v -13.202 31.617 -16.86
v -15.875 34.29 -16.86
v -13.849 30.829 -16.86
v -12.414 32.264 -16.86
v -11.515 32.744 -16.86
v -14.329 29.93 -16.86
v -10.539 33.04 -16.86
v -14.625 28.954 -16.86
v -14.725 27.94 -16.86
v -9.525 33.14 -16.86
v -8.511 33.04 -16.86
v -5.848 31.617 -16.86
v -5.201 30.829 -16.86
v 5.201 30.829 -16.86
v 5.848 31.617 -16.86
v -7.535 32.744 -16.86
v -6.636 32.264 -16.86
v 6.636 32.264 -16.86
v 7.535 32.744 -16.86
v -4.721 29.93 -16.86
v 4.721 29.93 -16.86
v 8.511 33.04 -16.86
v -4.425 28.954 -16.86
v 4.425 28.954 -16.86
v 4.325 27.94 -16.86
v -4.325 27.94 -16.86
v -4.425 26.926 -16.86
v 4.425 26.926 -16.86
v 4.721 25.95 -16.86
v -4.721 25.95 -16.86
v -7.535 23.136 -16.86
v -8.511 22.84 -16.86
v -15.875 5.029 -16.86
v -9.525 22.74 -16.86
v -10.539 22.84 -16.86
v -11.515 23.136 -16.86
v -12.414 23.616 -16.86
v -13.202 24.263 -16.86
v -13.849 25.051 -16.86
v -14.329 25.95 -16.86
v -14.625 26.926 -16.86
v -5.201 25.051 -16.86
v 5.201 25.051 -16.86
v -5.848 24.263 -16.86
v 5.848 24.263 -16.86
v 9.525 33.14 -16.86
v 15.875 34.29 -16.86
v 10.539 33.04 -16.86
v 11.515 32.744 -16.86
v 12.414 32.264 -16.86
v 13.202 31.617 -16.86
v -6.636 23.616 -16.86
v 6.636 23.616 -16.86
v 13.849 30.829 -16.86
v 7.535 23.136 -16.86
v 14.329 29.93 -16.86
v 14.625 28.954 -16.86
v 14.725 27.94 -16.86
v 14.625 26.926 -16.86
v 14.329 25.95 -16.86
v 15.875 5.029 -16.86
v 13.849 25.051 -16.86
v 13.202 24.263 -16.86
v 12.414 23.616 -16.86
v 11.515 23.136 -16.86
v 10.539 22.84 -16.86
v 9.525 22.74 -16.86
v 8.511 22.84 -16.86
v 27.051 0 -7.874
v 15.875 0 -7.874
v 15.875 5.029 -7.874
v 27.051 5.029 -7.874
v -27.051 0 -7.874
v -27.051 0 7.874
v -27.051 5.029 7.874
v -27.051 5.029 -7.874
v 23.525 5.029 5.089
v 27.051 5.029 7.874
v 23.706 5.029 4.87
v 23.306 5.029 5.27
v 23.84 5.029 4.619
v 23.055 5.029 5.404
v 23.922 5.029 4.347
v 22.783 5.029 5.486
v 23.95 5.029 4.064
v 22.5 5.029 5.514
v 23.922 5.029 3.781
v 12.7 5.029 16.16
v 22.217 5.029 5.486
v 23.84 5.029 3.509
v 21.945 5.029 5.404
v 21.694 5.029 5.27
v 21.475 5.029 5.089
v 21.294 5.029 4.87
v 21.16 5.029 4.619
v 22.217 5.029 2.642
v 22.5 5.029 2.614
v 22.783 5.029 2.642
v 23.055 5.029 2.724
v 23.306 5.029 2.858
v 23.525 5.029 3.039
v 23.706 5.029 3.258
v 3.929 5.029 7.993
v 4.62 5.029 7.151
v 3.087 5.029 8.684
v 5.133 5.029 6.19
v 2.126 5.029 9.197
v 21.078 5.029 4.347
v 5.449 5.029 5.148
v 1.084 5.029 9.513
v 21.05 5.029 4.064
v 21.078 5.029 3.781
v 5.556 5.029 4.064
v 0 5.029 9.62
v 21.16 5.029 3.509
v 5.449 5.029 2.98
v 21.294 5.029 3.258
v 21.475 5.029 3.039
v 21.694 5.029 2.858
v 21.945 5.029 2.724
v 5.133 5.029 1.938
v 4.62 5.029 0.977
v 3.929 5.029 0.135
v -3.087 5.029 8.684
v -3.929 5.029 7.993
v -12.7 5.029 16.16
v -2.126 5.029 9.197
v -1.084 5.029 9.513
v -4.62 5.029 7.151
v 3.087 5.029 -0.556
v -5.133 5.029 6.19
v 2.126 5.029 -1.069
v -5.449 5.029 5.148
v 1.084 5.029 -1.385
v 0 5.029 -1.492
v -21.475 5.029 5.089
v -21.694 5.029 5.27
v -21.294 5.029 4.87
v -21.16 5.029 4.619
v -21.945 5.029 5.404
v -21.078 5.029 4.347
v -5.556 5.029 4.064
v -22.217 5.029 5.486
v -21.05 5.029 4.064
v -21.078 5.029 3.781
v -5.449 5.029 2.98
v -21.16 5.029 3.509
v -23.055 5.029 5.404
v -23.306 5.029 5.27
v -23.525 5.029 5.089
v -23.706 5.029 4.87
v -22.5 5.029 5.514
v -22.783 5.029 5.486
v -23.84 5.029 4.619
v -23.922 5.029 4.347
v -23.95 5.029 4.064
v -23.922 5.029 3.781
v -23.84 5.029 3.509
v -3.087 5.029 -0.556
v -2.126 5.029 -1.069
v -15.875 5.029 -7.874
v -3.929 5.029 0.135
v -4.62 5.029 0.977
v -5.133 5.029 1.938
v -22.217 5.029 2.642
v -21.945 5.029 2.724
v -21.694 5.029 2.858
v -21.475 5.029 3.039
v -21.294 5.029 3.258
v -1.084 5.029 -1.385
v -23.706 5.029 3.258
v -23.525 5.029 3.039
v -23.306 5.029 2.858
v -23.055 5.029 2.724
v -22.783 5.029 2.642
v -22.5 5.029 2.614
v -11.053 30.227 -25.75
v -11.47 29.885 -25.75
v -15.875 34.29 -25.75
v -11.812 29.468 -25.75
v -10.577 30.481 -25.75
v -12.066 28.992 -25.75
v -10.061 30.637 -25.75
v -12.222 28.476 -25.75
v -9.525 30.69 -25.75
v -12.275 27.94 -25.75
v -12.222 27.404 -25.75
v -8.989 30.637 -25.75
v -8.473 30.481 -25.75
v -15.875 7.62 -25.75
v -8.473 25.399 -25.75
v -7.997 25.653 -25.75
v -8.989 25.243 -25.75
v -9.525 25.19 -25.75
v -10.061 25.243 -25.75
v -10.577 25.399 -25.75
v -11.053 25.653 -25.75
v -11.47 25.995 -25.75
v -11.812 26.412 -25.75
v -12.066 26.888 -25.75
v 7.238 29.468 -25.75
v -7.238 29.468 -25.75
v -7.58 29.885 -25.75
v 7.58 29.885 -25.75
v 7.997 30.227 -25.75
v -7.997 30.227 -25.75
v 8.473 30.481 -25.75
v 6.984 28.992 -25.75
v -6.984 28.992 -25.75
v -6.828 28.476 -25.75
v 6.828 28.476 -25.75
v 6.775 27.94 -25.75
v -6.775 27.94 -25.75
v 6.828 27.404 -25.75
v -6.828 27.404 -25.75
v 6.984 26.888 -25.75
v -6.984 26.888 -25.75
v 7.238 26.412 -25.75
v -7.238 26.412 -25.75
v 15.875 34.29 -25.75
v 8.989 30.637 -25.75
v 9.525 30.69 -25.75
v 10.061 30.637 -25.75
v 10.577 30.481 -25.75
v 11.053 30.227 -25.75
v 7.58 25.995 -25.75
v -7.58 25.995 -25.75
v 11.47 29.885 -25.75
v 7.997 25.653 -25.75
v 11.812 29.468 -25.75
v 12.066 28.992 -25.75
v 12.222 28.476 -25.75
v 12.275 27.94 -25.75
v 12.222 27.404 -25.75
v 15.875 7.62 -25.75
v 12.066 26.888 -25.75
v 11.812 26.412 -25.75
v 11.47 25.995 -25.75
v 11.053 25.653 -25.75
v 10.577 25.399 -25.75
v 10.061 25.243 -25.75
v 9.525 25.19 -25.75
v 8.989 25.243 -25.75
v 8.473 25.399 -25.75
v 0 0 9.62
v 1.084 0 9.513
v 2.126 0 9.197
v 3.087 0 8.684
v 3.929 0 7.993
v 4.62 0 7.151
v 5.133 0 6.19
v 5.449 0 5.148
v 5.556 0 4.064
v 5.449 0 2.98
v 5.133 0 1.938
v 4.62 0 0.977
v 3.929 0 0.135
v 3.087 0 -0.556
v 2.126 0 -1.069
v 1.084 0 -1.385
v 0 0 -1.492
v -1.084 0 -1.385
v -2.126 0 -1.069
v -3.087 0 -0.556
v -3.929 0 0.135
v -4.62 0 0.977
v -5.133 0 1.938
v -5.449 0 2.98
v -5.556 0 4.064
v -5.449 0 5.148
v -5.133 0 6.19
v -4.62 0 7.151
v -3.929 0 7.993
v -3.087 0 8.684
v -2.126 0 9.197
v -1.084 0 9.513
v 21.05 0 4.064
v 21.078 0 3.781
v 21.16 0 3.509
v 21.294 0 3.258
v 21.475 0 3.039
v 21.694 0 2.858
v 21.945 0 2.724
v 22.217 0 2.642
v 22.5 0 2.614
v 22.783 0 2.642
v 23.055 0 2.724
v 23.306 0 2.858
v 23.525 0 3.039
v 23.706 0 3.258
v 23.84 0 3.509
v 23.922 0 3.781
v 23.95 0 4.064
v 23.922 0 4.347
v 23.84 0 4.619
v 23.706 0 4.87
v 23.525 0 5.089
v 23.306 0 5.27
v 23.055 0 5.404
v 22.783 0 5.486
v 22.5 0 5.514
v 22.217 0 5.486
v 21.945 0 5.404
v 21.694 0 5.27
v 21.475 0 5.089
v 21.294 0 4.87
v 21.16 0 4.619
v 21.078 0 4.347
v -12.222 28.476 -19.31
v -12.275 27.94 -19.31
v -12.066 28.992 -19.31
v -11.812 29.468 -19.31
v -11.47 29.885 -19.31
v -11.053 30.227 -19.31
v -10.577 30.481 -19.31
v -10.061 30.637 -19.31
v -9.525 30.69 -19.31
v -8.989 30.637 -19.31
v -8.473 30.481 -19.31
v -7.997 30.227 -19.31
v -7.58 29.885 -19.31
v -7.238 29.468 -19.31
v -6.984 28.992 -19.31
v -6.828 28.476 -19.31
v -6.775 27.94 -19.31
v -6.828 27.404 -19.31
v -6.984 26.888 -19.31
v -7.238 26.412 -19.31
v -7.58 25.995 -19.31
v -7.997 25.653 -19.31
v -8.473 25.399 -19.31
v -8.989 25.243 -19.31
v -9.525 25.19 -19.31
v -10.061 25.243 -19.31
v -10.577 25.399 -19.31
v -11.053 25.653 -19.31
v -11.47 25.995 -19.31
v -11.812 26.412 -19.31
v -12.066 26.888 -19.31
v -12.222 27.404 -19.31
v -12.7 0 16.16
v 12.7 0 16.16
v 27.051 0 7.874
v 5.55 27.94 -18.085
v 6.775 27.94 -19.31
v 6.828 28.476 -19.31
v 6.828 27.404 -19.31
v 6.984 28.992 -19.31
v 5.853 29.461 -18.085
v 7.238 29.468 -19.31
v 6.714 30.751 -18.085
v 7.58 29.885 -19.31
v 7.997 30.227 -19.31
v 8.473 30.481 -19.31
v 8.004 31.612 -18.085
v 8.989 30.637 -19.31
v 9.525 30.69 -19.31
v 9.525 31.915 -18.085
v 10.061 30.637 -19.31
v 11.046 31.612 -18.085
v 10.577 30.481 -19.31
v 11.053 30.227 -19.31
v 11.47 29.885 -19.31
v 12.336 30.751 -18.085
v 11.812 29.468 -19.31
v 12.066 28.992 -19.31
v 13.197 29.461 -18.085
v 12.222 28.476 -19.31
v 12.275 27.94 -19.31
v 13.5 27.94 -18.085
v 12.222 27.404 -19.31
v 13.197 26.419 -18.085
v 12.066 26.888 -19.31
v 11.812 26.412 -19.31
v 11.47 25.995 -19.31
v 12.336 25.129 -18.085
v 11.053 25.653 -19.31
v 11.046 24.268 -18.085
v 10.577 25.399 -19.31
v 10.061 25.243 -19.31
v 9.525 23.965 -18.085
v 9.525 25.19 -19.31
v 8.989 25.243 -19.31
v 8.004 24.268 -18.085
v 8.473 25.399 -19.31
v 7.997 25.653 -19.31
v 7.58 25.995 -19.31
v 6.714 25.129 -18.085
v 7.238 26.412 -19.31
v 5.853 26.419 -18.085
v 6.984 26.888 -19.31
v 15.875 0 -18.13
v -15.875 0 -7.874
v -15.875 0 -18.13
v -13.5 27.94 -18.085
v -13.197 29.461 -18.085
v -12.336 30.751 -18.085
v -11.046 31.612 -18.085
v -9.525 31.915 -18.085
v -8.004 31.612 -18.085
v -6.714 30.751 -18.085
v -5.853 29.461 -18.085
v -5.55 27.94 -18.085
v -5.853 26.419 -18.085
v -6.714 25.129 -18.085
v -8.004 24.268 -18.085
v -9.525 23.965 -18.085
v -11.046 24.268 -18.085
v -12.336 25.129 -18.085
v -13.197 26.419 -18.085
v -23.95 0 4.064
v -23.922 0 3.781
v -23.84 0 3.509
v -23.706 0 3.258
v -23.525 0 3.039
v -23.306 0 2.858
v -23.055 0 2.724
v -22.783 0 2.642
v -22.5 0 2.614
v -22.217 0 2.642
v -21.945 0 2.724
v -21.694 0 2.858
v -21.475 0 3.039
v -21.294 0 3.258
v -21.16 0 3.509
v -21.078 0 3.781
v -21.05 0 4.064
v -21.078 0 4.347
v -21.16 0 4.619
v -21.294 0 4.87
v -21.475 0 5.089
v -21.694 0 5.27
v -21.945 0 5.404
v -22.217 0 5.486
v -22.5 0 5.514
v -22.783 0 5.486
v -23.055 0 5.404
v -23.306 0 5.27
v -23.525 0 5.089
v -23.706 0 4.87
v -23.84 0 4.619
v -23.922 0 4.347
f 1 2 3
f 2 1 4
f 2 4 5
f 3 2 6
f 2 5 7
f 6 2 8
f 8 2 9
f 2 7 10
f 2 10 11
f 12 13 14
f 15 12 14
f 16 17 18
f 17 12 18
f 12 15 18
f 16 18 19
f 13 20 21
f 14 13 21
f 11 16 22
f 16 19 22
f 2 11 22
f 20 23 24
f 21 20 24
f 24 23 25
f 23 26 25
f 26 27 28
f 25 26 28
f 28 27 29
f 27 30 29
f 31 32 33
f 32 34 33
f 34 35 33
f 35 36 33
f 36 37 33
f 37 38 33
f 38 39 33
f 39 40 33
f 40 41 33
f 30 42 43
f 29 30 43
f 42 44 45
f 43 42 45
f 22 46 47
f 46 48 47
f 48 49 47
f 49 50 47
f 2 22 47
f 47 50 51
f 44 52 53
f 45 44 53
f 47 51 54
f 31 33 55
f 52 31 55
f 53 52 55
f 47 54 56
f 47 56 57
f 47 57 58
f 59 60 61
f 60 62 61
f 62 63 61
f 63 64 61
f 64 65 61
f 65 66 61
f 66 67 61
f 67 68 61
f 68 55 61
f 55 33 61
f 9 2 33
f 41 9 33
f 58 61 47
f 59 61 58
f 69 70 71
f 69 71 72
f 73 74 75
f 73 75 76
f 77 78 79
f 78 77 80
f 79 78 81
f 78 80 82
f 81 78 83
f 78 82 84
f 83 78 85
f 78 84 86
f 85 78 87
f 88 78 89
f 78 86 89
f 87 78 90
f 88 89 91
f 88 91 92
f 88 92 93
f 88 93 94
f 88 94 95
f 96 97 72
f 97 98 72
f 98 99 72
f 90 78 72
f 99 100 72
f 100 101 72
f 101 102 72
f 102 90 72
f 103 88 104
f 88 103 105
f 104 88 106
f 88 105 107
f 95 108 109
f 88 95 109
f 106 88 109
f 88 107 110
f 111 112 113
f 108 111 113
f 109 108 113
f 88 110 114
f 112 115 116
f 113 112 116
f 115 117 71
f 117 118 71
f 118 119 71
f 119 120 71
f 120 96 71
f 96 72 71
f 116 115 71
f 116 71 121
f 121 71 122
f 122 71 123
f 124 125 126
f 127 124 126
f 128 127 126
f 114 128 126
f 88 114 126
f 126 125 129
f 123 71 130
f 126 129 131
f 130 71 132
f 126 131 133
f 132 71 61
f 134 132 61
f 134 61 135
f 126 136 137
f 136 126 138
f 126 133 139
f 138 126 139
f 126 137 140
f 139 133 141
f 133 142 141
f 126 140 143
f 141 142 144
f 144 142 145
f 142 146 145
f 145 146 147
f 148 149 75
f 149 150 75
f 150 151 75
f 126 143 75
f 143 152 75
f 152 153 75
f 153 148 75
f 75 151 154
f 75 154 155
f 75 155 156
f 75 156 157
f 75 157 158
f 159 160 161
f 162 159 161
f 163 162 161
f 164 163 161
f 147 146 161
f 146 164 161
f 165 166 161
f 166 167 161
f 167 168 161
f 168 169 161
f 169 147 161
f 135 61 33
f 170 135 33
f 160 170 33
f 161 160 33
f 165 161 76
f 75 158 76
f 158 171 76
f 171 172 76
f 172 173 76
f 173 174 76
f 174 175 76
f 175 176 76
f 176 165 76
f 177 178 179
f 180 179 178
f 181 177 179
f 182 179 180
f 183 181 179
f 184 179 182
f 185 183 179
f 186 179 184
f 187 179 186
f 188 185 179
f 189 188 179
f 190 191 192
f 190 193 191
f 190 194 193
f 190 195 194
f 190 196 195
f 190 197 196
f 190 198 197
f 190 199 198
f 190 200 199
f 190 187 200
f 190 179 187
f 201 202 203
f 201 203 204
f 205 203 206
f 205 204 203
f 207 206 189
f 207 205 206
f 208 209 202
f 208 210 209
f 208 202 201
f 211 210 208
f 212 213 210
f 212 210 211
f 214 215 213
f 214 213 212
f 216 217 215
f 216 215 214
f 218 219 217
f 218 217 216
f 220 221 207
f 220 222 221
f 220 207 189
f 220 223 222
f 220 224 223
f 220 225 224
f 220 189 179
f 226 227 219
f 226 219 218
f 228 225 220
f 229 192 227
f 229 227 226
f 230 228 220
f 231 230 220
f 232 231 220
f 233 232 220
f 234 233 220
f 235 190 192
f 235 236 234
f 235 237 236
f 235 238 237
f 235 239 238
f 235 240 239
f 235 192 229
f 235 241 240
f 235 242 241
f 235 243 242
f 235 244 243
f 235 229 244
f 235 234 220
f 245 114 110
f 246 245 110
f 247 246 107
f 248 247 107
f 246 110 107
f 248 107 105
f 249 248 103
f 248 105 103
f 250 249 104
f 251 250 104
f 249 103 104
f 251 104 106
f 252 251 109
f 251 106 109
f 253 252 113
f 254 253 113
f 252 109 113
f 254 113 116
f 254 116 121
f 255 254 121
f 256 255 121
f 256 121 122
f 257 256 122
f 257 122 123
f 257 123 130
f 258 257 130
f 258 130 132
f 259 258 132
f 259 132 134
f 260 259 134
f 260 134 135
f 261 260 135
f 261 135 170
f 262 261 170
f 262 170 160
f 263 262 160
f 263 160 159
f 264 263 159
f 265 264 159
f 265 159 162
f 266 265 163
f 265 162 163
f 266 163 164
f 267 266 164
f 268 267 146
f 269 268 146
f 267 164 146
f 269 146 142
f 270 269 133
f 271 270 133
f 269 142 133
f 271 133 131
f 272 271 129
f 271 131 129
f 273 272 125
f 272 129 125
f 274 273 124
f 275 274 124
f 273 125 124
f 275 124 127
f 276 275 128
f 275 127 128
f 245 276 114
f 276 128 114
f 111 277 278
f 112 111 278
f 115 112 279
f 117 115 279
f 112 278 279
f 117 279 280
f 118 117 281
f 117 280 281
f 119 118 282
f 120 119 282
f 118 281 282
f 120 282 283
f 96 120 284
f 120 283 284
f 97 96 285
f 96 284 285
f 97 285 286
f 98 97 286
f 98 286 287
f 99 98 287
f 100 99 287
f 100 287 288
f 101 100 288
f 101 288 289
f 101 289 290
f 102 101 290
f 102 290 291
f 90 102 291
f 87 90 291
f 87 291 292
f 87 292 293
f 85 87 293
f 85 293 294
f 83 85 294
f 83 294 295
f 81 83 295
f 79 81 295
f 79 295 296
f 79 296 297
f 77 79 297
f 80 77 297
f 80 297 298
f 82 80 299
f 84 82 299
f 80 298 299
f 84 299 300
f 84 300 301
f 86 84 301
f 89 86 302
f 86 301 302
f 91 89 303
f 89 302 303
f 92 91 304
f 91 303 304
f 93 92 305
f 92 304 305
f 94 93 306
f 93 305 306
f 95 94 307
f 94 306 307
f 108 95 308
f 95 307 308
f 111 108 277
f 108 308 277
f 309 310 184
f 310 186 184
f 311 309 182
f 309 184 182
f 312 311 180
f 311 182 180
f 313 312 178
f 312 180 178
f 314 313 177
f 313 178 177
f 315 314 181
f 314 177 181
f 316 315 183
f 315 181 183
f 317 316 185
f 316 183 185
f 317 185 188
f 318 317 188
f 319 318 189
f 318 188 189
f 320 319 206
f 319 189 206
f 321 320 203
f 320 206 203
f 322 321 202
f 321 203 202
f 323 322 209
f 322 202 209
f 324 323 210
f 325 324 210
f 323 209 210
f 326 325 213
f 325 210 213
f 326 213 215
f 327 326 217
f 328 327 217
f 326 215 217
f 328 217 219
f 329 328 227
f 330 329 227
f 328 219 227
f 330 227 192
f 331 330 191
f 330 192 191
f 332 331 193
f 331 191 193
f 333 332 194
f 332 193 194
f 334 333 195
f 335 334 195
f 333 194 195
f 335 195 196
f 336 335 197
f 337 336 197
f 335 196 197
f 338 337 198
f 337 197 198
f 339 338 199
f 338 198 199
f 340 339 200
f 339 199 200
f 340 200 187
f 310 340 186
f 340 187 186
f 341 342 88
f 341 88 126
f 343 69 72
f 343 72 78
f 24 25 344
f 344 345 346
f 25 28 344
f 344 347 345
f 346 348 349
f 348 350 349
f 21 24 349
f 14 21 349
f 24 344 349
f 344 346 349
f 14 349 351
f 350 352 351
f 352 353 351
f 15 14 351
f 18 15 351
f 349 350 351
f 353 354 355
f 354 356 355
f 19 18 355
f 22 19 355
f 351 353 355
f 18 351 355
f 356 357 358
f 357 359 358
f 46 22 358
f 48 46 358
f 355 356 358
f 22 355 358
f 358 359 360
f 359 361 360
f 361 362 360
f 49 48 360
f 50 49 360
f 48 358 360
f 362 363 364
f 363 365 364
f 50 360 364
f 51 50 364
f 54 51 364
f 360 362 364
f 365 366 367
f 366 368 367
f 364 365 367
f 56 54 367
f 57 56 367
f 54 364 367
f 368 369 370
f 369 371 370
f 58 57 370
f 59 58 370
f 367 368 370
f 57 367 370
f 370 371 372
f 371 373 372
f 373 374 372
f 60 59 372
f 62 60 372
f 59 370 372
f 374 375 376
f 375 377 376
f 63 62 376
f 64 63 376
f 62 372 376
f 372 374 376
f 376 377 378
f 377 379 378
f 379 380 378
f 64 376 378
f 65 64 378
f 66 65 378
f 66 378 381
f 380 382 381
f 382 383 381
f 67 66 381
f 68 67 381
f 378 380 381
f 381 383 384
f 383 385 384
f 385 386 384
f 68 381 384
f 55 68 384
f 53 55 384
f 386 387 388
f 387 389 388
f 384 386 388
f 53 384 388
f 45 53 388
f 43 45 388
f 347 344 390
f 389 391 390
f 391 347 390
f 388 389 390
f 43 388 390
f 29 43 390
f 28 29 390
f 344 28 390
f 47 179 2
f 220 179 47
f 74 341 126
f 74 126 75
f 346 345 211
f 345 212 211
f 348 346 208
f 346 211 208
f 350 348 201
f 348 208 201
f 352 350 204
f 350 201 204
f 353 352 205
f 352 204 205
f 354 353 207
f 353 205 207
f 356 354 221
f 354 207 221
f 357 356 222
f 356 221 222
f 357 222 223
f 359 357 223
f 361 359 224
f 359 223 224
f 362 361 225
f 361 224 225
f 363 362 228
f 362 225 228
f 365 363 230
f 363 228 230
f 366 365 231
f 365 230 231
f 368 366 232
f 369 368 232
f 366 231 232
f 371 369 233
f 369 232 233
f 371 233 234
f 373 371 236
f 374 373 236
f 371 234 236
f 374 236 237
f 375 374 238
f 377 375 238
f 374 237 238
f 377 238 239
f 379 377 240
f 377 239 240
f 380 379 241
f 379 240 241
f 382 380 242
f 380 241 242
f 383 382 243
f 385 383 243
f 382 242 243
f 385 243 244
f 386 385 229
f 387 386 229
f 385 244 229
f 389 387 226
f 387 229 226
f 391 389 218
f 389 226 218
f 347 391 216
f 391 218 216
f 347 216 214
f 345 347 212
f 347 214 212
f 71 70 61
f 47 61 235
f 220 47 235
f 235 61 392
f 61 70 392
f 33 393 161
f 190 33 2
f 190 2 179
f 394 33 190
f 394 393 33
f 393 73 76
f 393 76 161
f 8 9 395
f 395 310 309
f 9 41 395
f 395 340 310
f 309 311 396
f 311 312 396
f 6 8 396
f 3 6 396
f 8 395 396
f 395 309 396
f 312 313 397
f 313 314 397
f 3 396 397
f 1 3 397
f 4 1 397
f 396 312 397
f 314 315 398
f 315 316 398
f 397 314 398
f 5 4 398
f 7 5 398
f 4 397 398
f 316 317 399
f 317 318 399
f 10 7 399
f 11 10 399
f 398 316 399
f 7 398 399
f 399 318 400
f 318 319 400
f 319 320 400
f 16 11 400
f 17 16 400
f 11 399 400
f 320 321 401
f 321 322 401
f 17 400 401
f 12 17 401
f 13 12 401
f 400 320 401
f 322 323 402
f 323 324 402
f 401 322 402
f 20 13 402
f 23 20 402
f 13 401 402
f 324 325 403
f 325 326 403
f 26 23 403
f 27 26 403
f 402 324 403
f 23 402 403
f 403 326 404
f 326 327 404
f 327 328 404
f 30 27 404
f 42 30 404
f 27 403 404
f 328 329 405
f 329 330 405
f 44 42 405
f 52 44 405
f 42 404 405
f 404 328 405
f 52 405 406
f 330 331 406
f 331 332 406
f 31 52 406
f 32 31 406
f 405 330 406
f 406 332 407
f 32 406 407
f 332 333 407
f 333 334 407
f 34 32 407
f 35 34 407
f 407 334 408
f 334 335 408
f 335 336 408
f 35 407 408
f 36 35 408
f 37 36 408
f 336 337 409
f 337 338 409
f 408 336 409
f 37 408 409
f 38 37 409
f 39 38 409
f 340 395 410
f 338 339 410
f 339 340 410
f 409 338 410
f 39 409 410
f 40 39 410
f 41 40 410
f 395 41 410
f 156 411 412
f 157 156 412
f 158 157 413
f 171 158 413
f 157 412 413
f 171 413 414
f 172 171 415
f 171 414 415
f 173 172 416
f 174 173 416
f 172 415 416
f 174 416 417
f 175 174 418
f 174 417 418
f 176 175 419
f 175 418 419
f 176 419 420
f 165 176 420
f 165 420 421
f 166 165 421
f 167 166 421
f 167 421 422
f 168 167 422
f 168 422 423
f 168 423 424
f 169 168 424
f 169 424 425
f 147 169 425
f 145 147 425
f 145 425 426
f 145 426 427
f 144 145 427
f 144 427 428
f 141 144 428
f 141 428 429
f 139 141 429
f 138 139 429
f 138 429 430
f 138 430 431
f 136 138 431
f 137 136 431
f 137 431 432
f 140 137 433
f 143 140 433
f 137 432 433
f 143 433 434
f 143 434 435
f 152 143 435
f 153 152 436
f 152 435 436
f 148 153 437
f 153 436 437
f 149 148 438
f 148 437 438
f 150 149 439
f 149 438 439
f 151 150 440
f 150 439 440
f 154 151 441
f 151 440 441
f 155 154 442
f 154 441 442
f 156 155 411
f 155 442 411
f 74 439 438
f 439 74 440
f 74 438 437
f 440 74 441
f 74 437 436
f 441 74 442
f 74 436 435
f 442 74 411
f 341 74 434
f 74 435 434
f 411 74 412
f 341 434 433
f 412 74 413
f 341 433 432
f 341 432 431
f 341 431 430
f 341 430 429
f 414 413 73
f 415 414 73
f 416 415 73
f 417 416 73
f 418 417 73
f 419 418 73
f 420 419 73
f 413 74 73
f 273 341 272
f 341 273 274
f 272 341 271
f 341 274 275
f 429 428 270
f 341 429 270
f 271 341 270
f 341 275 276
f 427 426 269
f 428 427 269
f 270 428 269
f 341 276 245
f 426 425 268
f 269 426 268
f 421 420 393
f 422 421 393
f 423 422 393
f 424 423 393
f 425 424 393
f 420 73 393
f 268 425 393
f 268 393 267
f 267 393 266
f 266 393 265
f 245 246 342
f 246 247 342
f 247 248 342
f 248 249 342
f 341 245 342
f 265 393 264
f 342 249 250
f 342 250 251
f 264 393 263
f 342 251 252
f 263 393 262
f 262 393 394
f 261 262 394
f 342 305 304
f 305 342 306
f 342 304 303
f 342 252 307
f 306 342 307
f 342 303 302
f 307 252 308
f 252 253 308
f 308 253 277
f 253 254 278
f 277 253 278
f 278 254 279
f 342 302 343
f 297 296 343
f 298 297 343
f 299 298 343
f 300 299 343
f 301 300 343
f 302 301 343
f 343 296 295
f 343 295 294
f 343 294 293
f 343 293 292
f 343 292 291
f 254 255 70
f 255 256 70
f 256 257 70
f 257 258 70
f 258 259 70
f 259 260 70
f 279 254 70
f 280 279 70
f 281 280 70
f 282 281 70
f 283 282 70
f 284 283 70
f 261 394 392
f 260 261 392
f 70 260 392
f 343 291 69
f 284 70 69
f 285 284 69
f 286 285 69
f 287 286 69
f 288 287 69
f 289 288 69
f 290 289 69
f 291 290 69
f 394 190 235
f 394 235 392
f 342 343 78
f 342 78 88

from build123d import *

# Parameters (mm, degrees)
BOSS_EXTRUDE1_DEPTH                             = 5.0292
SKETCH2_W                                       = 31.75
SKETCH2_H                                       = 8.89
BOSS_EXTRUDE2_DEPTH                             = 34.29
CUT_EXTRUDE1_DEPTH                              = 61.675621628
CUT_EXTRUDE1_DEPTH_BACK                         = 61.675621628
CSK_FOR_M5_FLAT_HEAD_MACHINE_SCREW1_D           = 5.5
CSK_FOR_M5_FLAT_HEAD_MACHINE_SCREW1_CSINK_D     = 10.4
CSK_FOR_M5_FLAT_HEAD_MACHINE_SCREW1_CSINK_ANGLE = 90
SKETCH7_R                                       = 5.55625
CUT_EXTRUDE2_DEPTH                              = 48.445089331
M2_5_CLEARANCE_HOLE1_D                          = 2.9


with BuildPart() as part:
    # Sketch1 → Boss-Extrude1 (new body)
    with BuildSketch(Plane(origin=(0, 0, 0), x_dir=(1, 0, 0), z_dir=(0, 1, 0))):
        Polygon((-27.051, 7.874), (-15.875, 7.874), (-15.875, 16.860446287), (15.875, 16.860446287), (15.875, 7.874), (27.051, 7.874), (27.051, -7.874), (12.7, -16.159553713), (-12.7, -16.159553713), (-27.051, -7.874), align=None)
    extrude(amount=BOSS_EXTRUDE1_DEPTH)

    # Sketch2 → Boss-Extrude2 (add)
    with BuildSketch(Plane(origin=(0, 0, 0), x_dir=(1, 0, 0), z_dir=(0, 1, 0))):
        with Locations((0, 21.305446287)):
            Rectangle(SKETCH2_W, SKETCH2_H)
    extrude(amount=BOSS_EXTRUDE2_DEPTH)

    # Sketch3 → Cut-Extrude1 (cut, two sides: drawn at the far end of the back side and taken through both)
    with BuildSketch(Plane(origin=(15.875, 0, 0), x_dir=(0, 0, -1), z_dir=(1, 0, 0)).offset(-CUT_EXTRUDE1_DEPTH_BACK)):
        Polygon((103.074442863, 84.943996576), (25.750446287, 7.62), (18.130446287, 0), (-59.19355029, -77.323996576), (95.454442863, -231.971989729), (257.722436016, -69.703996576), align=None)
    extrude(amount=CUT_EXTRUDE1_DEPTH + CUT_EXTRUDE1_DEPTH_BACK, mode=Mode.SUBTRACT)

    # CSK for M5 Flat Head Machine Screw1 (through all)
    with Locations(Plane.XY.offset(-16.860446287)):
        with Locations((-9.525, 27.94), (9.525, 27.94)):
            CounterSinkHole(CSK_FOR_M5_FLAT_HEAD_MACHINE_SCREW1_D / 2, CSK_FOR_M5_FLAT_HEAD_MACHINE_SCREW1_CSINK_D / 2, counter_sink_angle=CSK_FOR_M5_FLAT_HEAD_MACHINE_SCREW1_CSINK_ANGLE)

    # Sketch7 → Cut-Extrude2 (cut, through all)
    with BuildSketch(Plane(origin=(0, 5.0292, 0), x_dir=(1, 0, 0), z_dir=(0, 1, 0))):
        with Locations(Location((0, -4.064, 0), (0, 0, 270))):
            Circle(SKETCH7_R)
    extrude(amount=-CUT_EXTRUDE2_DEPTH, mode=Mode.SUBTRACT)

    # M2.5 Clearance Hole1 (through all)
    with Locations(Plane(origin=(0, 5.0292, 0), x_dir=(1, 0, 0), z_dir=(0, 1, 0))):
        with Locations((-22.5, -4.064), (22.5, -4.064)):
            Hole(M2_5_CLEARANCE_HOLE1_D / 2)


solid = part.part
